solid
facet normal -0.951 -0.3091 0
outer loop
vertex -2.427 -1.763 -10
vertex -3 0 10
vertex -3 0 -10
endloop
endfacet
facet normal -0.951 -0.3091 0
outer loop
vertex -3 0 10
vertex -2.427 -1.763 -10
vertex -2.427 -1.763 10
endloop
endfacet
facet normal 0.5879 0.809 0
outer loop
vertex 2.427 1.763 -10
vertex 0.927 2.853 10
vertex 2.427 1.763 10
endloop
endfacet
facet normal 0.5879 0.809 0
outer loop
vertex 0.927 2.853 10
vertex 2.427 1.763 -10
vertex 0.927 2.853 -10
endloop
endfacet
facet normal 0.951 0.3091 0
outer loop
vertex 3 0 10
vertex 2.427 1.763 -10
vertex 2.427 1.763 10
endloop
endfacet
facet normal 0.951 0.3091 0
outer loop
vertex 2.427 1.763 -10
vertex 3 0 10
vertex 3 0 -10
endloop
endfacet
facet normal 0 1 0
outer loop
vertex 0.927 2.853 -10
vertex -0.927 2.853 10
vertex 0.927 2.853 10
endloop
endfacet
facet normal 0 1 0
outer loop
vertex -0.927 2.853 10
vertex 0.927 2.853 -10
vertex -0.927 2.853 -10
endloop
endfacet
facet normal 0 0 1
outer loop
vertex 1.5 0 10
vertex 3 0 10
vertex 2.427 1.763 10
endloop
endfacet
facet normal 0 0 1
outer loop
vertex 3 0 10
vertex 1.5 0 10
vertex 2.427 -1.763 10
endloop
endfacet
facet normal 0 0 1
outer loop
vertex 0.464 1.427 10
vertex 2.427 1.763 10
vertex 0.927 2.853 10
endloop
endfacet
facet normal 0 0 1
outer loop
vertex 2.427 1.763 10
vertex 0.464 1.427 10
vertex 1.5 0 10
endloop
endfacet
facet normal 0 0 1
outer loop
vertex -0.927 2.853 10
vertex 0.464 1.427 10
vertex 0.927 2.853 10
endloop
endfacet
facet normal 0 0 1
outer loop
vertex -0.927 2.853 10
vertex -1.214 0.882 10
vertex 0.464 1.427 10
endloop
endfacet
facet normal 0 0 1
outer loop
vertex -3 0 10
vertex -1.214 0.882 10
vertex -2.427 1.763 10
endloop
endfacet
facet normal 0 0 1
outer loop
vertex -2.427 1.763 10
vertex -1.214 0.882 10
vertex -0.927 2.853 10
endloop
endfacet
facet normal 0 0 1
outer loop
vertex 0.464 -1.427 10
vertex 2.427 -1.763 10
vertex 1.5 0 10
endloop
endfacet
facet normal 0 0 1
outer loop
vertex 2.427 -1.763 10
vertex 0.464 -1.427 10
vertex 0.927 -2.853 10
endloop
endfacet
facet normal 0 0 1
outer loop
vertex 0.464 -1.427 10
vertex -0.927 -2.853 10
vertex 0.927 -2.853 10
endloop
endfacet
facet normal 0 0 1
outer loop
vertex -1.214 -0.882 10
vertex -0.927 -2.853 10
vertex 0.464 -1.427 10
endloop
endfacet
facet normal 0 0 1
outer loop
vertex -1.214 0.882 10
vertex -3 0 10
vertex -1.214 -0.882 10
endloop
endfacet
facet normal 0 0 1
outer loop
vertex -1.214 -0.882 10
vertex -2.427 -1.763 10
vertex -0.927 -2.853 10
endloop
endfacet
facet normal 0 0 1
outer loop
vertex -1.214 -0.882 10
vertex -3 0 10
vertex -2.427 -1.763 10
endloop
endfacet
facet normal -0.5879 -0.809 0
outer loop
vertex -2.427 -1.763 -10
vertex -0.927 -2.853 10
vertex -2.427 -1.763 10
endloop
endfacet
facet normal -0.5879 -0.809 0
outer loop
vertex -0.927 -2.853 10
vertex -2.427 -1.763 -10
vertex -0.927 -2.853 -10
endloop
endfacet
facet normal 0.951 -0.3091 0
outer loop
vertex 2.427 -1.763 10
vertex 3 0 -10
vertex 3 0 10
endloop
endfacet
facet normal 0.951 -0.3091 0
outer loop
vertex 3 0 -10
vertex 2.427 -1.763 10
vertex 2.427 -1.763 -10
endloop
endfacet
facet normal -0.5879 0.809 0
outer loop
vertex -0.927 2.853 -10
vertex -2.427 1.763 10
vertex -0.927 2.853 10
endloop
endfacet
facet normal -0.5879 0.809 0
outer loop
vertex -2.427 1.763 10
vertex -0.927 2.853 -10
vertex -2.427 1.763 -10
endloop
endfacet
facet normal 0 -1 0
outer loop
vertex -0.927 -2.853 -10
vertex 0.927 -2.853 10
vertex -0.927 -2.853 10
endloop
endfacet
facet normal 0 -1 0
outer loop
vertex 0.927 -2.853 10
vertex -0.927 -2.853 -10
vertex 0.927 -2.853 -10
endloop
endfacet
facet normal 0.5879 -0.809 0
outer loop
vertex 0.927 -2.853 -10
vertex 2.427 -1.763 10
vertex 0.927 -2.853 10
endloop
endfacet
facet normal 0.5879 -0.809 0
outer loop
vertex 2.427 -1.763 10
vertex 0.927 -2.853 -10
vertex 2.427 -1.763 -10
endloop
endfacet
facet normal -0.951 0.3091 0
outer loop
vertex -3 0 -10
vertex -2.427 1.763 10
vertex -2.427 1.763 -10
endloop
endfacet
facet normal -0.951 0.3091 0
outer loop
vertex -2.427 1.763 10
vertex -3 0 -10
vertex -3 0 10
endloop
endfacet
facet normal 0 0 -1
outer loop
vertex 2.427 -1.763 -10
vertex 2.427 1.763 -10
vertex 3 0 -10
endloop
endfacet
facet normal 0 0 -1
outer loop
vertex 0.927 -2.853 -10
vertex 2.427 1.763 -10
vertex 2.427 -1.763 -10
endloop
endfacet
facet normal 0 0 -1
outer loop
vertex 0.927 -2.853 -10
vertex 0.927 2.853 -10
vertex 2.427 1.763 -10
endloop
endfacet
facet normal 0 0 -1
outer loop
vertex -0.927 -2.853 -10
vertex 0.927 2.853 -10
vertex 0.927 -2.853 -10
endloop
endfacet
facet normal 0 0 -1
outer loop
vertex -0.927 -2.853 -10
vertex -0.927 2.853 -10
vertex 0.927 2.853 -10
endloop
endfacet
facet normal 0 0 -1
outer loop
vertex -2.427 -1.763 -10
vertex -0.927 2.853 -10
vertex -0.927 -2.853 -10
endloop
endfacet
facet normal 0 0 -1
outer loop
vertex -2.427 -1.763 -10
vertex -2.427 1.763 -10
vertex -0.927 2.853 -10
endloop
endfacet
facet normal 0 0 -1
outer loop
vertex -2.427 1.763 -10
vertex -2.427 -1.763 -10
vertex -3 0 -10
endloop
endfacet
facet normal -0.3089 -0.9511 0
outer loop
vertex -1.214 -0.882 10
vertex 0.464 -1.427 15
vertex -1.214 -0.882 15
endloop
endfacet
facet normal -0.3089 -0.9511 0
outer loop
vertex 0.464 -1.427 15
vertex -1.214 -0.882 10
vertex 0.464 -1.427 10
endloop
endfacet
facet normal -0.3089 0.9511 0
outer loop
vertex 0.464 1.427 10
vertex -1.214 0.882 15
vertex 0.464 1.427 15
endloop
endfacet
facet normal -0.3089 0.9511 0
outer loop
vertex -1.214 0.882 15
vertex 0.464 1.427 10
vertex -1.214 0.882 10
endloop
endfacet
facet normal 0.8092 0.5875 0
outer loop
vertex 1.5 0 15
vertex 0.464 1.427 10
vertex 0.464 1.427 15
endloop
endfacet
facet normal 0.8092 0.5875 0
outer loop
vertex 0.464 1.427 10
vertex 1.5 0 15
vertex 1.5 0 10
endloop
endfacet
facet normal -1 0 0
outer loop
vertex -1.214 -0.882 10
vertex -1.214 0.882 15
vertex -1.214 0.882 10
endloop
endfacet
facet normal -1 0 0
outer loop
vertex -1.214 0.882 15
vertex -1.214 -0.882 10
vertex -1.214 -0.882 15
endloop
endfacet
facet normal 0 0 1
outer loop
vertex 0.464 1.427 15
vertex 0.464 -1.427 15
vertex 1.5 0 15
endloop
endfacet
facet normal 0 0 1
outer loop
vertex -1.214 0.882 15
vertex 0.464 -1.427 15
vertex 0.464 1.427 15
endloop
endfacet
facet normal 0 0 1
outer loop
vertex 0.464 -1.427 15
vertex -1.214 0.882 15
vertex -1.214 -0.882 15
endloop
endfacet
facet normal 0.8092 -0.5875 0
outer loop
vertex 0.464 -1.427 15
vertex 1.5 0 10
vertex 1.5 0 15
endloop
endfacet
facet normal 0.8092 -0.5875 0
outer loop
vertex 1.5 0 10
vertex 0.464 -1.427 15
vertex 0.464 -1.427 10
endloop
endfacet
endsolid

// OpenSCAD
// Parameters
thread_diameter_mm = 3.0; //[1.5:6.0:0.1]
length_mm = 20.0; //[10.0:40.0:0.5]
outer_diameter_mm = 6.0; //[3.5:12.0:0.5]
threaded_length_top_mm = 6.0; //[0.0:20.0:0.5]
threaded_length_bottom_mm = 0.0; //[0.0:20.0:0.5]
overlap_mm = 1.0; //[0.5:2.0:0.1]

// Standoff - complete geometry
module standoff() {
  color("Silver") {
    // Main body
    cylinder(h=length_mm, r=outer_diameter_mm/2, center=true);
  }
}

// Pillar - complete geometry
module pillar() {
  color("DimGray") {
    // Top threaded section
    translate([0, 0, length_mm/2 + threaded_length_top_mm/2 - overlap_mm])
      cylinder(h=threaded_length_top_mm, r=thread_diameter_mm/2, center=true);
    
    // Bottom threaded section
    translate([0, 0, -(length_mm/2 + threaded_length_bottom_mm/2 - overlap_mm)])
      cylinder(h=threaded_length_bottom_mm, r=thread_diameter_mm/2, center=true);
  }
}

// Assembly
module assembly() {
  union() {
    standoff();
    pillar();
  }
}

assembly();
